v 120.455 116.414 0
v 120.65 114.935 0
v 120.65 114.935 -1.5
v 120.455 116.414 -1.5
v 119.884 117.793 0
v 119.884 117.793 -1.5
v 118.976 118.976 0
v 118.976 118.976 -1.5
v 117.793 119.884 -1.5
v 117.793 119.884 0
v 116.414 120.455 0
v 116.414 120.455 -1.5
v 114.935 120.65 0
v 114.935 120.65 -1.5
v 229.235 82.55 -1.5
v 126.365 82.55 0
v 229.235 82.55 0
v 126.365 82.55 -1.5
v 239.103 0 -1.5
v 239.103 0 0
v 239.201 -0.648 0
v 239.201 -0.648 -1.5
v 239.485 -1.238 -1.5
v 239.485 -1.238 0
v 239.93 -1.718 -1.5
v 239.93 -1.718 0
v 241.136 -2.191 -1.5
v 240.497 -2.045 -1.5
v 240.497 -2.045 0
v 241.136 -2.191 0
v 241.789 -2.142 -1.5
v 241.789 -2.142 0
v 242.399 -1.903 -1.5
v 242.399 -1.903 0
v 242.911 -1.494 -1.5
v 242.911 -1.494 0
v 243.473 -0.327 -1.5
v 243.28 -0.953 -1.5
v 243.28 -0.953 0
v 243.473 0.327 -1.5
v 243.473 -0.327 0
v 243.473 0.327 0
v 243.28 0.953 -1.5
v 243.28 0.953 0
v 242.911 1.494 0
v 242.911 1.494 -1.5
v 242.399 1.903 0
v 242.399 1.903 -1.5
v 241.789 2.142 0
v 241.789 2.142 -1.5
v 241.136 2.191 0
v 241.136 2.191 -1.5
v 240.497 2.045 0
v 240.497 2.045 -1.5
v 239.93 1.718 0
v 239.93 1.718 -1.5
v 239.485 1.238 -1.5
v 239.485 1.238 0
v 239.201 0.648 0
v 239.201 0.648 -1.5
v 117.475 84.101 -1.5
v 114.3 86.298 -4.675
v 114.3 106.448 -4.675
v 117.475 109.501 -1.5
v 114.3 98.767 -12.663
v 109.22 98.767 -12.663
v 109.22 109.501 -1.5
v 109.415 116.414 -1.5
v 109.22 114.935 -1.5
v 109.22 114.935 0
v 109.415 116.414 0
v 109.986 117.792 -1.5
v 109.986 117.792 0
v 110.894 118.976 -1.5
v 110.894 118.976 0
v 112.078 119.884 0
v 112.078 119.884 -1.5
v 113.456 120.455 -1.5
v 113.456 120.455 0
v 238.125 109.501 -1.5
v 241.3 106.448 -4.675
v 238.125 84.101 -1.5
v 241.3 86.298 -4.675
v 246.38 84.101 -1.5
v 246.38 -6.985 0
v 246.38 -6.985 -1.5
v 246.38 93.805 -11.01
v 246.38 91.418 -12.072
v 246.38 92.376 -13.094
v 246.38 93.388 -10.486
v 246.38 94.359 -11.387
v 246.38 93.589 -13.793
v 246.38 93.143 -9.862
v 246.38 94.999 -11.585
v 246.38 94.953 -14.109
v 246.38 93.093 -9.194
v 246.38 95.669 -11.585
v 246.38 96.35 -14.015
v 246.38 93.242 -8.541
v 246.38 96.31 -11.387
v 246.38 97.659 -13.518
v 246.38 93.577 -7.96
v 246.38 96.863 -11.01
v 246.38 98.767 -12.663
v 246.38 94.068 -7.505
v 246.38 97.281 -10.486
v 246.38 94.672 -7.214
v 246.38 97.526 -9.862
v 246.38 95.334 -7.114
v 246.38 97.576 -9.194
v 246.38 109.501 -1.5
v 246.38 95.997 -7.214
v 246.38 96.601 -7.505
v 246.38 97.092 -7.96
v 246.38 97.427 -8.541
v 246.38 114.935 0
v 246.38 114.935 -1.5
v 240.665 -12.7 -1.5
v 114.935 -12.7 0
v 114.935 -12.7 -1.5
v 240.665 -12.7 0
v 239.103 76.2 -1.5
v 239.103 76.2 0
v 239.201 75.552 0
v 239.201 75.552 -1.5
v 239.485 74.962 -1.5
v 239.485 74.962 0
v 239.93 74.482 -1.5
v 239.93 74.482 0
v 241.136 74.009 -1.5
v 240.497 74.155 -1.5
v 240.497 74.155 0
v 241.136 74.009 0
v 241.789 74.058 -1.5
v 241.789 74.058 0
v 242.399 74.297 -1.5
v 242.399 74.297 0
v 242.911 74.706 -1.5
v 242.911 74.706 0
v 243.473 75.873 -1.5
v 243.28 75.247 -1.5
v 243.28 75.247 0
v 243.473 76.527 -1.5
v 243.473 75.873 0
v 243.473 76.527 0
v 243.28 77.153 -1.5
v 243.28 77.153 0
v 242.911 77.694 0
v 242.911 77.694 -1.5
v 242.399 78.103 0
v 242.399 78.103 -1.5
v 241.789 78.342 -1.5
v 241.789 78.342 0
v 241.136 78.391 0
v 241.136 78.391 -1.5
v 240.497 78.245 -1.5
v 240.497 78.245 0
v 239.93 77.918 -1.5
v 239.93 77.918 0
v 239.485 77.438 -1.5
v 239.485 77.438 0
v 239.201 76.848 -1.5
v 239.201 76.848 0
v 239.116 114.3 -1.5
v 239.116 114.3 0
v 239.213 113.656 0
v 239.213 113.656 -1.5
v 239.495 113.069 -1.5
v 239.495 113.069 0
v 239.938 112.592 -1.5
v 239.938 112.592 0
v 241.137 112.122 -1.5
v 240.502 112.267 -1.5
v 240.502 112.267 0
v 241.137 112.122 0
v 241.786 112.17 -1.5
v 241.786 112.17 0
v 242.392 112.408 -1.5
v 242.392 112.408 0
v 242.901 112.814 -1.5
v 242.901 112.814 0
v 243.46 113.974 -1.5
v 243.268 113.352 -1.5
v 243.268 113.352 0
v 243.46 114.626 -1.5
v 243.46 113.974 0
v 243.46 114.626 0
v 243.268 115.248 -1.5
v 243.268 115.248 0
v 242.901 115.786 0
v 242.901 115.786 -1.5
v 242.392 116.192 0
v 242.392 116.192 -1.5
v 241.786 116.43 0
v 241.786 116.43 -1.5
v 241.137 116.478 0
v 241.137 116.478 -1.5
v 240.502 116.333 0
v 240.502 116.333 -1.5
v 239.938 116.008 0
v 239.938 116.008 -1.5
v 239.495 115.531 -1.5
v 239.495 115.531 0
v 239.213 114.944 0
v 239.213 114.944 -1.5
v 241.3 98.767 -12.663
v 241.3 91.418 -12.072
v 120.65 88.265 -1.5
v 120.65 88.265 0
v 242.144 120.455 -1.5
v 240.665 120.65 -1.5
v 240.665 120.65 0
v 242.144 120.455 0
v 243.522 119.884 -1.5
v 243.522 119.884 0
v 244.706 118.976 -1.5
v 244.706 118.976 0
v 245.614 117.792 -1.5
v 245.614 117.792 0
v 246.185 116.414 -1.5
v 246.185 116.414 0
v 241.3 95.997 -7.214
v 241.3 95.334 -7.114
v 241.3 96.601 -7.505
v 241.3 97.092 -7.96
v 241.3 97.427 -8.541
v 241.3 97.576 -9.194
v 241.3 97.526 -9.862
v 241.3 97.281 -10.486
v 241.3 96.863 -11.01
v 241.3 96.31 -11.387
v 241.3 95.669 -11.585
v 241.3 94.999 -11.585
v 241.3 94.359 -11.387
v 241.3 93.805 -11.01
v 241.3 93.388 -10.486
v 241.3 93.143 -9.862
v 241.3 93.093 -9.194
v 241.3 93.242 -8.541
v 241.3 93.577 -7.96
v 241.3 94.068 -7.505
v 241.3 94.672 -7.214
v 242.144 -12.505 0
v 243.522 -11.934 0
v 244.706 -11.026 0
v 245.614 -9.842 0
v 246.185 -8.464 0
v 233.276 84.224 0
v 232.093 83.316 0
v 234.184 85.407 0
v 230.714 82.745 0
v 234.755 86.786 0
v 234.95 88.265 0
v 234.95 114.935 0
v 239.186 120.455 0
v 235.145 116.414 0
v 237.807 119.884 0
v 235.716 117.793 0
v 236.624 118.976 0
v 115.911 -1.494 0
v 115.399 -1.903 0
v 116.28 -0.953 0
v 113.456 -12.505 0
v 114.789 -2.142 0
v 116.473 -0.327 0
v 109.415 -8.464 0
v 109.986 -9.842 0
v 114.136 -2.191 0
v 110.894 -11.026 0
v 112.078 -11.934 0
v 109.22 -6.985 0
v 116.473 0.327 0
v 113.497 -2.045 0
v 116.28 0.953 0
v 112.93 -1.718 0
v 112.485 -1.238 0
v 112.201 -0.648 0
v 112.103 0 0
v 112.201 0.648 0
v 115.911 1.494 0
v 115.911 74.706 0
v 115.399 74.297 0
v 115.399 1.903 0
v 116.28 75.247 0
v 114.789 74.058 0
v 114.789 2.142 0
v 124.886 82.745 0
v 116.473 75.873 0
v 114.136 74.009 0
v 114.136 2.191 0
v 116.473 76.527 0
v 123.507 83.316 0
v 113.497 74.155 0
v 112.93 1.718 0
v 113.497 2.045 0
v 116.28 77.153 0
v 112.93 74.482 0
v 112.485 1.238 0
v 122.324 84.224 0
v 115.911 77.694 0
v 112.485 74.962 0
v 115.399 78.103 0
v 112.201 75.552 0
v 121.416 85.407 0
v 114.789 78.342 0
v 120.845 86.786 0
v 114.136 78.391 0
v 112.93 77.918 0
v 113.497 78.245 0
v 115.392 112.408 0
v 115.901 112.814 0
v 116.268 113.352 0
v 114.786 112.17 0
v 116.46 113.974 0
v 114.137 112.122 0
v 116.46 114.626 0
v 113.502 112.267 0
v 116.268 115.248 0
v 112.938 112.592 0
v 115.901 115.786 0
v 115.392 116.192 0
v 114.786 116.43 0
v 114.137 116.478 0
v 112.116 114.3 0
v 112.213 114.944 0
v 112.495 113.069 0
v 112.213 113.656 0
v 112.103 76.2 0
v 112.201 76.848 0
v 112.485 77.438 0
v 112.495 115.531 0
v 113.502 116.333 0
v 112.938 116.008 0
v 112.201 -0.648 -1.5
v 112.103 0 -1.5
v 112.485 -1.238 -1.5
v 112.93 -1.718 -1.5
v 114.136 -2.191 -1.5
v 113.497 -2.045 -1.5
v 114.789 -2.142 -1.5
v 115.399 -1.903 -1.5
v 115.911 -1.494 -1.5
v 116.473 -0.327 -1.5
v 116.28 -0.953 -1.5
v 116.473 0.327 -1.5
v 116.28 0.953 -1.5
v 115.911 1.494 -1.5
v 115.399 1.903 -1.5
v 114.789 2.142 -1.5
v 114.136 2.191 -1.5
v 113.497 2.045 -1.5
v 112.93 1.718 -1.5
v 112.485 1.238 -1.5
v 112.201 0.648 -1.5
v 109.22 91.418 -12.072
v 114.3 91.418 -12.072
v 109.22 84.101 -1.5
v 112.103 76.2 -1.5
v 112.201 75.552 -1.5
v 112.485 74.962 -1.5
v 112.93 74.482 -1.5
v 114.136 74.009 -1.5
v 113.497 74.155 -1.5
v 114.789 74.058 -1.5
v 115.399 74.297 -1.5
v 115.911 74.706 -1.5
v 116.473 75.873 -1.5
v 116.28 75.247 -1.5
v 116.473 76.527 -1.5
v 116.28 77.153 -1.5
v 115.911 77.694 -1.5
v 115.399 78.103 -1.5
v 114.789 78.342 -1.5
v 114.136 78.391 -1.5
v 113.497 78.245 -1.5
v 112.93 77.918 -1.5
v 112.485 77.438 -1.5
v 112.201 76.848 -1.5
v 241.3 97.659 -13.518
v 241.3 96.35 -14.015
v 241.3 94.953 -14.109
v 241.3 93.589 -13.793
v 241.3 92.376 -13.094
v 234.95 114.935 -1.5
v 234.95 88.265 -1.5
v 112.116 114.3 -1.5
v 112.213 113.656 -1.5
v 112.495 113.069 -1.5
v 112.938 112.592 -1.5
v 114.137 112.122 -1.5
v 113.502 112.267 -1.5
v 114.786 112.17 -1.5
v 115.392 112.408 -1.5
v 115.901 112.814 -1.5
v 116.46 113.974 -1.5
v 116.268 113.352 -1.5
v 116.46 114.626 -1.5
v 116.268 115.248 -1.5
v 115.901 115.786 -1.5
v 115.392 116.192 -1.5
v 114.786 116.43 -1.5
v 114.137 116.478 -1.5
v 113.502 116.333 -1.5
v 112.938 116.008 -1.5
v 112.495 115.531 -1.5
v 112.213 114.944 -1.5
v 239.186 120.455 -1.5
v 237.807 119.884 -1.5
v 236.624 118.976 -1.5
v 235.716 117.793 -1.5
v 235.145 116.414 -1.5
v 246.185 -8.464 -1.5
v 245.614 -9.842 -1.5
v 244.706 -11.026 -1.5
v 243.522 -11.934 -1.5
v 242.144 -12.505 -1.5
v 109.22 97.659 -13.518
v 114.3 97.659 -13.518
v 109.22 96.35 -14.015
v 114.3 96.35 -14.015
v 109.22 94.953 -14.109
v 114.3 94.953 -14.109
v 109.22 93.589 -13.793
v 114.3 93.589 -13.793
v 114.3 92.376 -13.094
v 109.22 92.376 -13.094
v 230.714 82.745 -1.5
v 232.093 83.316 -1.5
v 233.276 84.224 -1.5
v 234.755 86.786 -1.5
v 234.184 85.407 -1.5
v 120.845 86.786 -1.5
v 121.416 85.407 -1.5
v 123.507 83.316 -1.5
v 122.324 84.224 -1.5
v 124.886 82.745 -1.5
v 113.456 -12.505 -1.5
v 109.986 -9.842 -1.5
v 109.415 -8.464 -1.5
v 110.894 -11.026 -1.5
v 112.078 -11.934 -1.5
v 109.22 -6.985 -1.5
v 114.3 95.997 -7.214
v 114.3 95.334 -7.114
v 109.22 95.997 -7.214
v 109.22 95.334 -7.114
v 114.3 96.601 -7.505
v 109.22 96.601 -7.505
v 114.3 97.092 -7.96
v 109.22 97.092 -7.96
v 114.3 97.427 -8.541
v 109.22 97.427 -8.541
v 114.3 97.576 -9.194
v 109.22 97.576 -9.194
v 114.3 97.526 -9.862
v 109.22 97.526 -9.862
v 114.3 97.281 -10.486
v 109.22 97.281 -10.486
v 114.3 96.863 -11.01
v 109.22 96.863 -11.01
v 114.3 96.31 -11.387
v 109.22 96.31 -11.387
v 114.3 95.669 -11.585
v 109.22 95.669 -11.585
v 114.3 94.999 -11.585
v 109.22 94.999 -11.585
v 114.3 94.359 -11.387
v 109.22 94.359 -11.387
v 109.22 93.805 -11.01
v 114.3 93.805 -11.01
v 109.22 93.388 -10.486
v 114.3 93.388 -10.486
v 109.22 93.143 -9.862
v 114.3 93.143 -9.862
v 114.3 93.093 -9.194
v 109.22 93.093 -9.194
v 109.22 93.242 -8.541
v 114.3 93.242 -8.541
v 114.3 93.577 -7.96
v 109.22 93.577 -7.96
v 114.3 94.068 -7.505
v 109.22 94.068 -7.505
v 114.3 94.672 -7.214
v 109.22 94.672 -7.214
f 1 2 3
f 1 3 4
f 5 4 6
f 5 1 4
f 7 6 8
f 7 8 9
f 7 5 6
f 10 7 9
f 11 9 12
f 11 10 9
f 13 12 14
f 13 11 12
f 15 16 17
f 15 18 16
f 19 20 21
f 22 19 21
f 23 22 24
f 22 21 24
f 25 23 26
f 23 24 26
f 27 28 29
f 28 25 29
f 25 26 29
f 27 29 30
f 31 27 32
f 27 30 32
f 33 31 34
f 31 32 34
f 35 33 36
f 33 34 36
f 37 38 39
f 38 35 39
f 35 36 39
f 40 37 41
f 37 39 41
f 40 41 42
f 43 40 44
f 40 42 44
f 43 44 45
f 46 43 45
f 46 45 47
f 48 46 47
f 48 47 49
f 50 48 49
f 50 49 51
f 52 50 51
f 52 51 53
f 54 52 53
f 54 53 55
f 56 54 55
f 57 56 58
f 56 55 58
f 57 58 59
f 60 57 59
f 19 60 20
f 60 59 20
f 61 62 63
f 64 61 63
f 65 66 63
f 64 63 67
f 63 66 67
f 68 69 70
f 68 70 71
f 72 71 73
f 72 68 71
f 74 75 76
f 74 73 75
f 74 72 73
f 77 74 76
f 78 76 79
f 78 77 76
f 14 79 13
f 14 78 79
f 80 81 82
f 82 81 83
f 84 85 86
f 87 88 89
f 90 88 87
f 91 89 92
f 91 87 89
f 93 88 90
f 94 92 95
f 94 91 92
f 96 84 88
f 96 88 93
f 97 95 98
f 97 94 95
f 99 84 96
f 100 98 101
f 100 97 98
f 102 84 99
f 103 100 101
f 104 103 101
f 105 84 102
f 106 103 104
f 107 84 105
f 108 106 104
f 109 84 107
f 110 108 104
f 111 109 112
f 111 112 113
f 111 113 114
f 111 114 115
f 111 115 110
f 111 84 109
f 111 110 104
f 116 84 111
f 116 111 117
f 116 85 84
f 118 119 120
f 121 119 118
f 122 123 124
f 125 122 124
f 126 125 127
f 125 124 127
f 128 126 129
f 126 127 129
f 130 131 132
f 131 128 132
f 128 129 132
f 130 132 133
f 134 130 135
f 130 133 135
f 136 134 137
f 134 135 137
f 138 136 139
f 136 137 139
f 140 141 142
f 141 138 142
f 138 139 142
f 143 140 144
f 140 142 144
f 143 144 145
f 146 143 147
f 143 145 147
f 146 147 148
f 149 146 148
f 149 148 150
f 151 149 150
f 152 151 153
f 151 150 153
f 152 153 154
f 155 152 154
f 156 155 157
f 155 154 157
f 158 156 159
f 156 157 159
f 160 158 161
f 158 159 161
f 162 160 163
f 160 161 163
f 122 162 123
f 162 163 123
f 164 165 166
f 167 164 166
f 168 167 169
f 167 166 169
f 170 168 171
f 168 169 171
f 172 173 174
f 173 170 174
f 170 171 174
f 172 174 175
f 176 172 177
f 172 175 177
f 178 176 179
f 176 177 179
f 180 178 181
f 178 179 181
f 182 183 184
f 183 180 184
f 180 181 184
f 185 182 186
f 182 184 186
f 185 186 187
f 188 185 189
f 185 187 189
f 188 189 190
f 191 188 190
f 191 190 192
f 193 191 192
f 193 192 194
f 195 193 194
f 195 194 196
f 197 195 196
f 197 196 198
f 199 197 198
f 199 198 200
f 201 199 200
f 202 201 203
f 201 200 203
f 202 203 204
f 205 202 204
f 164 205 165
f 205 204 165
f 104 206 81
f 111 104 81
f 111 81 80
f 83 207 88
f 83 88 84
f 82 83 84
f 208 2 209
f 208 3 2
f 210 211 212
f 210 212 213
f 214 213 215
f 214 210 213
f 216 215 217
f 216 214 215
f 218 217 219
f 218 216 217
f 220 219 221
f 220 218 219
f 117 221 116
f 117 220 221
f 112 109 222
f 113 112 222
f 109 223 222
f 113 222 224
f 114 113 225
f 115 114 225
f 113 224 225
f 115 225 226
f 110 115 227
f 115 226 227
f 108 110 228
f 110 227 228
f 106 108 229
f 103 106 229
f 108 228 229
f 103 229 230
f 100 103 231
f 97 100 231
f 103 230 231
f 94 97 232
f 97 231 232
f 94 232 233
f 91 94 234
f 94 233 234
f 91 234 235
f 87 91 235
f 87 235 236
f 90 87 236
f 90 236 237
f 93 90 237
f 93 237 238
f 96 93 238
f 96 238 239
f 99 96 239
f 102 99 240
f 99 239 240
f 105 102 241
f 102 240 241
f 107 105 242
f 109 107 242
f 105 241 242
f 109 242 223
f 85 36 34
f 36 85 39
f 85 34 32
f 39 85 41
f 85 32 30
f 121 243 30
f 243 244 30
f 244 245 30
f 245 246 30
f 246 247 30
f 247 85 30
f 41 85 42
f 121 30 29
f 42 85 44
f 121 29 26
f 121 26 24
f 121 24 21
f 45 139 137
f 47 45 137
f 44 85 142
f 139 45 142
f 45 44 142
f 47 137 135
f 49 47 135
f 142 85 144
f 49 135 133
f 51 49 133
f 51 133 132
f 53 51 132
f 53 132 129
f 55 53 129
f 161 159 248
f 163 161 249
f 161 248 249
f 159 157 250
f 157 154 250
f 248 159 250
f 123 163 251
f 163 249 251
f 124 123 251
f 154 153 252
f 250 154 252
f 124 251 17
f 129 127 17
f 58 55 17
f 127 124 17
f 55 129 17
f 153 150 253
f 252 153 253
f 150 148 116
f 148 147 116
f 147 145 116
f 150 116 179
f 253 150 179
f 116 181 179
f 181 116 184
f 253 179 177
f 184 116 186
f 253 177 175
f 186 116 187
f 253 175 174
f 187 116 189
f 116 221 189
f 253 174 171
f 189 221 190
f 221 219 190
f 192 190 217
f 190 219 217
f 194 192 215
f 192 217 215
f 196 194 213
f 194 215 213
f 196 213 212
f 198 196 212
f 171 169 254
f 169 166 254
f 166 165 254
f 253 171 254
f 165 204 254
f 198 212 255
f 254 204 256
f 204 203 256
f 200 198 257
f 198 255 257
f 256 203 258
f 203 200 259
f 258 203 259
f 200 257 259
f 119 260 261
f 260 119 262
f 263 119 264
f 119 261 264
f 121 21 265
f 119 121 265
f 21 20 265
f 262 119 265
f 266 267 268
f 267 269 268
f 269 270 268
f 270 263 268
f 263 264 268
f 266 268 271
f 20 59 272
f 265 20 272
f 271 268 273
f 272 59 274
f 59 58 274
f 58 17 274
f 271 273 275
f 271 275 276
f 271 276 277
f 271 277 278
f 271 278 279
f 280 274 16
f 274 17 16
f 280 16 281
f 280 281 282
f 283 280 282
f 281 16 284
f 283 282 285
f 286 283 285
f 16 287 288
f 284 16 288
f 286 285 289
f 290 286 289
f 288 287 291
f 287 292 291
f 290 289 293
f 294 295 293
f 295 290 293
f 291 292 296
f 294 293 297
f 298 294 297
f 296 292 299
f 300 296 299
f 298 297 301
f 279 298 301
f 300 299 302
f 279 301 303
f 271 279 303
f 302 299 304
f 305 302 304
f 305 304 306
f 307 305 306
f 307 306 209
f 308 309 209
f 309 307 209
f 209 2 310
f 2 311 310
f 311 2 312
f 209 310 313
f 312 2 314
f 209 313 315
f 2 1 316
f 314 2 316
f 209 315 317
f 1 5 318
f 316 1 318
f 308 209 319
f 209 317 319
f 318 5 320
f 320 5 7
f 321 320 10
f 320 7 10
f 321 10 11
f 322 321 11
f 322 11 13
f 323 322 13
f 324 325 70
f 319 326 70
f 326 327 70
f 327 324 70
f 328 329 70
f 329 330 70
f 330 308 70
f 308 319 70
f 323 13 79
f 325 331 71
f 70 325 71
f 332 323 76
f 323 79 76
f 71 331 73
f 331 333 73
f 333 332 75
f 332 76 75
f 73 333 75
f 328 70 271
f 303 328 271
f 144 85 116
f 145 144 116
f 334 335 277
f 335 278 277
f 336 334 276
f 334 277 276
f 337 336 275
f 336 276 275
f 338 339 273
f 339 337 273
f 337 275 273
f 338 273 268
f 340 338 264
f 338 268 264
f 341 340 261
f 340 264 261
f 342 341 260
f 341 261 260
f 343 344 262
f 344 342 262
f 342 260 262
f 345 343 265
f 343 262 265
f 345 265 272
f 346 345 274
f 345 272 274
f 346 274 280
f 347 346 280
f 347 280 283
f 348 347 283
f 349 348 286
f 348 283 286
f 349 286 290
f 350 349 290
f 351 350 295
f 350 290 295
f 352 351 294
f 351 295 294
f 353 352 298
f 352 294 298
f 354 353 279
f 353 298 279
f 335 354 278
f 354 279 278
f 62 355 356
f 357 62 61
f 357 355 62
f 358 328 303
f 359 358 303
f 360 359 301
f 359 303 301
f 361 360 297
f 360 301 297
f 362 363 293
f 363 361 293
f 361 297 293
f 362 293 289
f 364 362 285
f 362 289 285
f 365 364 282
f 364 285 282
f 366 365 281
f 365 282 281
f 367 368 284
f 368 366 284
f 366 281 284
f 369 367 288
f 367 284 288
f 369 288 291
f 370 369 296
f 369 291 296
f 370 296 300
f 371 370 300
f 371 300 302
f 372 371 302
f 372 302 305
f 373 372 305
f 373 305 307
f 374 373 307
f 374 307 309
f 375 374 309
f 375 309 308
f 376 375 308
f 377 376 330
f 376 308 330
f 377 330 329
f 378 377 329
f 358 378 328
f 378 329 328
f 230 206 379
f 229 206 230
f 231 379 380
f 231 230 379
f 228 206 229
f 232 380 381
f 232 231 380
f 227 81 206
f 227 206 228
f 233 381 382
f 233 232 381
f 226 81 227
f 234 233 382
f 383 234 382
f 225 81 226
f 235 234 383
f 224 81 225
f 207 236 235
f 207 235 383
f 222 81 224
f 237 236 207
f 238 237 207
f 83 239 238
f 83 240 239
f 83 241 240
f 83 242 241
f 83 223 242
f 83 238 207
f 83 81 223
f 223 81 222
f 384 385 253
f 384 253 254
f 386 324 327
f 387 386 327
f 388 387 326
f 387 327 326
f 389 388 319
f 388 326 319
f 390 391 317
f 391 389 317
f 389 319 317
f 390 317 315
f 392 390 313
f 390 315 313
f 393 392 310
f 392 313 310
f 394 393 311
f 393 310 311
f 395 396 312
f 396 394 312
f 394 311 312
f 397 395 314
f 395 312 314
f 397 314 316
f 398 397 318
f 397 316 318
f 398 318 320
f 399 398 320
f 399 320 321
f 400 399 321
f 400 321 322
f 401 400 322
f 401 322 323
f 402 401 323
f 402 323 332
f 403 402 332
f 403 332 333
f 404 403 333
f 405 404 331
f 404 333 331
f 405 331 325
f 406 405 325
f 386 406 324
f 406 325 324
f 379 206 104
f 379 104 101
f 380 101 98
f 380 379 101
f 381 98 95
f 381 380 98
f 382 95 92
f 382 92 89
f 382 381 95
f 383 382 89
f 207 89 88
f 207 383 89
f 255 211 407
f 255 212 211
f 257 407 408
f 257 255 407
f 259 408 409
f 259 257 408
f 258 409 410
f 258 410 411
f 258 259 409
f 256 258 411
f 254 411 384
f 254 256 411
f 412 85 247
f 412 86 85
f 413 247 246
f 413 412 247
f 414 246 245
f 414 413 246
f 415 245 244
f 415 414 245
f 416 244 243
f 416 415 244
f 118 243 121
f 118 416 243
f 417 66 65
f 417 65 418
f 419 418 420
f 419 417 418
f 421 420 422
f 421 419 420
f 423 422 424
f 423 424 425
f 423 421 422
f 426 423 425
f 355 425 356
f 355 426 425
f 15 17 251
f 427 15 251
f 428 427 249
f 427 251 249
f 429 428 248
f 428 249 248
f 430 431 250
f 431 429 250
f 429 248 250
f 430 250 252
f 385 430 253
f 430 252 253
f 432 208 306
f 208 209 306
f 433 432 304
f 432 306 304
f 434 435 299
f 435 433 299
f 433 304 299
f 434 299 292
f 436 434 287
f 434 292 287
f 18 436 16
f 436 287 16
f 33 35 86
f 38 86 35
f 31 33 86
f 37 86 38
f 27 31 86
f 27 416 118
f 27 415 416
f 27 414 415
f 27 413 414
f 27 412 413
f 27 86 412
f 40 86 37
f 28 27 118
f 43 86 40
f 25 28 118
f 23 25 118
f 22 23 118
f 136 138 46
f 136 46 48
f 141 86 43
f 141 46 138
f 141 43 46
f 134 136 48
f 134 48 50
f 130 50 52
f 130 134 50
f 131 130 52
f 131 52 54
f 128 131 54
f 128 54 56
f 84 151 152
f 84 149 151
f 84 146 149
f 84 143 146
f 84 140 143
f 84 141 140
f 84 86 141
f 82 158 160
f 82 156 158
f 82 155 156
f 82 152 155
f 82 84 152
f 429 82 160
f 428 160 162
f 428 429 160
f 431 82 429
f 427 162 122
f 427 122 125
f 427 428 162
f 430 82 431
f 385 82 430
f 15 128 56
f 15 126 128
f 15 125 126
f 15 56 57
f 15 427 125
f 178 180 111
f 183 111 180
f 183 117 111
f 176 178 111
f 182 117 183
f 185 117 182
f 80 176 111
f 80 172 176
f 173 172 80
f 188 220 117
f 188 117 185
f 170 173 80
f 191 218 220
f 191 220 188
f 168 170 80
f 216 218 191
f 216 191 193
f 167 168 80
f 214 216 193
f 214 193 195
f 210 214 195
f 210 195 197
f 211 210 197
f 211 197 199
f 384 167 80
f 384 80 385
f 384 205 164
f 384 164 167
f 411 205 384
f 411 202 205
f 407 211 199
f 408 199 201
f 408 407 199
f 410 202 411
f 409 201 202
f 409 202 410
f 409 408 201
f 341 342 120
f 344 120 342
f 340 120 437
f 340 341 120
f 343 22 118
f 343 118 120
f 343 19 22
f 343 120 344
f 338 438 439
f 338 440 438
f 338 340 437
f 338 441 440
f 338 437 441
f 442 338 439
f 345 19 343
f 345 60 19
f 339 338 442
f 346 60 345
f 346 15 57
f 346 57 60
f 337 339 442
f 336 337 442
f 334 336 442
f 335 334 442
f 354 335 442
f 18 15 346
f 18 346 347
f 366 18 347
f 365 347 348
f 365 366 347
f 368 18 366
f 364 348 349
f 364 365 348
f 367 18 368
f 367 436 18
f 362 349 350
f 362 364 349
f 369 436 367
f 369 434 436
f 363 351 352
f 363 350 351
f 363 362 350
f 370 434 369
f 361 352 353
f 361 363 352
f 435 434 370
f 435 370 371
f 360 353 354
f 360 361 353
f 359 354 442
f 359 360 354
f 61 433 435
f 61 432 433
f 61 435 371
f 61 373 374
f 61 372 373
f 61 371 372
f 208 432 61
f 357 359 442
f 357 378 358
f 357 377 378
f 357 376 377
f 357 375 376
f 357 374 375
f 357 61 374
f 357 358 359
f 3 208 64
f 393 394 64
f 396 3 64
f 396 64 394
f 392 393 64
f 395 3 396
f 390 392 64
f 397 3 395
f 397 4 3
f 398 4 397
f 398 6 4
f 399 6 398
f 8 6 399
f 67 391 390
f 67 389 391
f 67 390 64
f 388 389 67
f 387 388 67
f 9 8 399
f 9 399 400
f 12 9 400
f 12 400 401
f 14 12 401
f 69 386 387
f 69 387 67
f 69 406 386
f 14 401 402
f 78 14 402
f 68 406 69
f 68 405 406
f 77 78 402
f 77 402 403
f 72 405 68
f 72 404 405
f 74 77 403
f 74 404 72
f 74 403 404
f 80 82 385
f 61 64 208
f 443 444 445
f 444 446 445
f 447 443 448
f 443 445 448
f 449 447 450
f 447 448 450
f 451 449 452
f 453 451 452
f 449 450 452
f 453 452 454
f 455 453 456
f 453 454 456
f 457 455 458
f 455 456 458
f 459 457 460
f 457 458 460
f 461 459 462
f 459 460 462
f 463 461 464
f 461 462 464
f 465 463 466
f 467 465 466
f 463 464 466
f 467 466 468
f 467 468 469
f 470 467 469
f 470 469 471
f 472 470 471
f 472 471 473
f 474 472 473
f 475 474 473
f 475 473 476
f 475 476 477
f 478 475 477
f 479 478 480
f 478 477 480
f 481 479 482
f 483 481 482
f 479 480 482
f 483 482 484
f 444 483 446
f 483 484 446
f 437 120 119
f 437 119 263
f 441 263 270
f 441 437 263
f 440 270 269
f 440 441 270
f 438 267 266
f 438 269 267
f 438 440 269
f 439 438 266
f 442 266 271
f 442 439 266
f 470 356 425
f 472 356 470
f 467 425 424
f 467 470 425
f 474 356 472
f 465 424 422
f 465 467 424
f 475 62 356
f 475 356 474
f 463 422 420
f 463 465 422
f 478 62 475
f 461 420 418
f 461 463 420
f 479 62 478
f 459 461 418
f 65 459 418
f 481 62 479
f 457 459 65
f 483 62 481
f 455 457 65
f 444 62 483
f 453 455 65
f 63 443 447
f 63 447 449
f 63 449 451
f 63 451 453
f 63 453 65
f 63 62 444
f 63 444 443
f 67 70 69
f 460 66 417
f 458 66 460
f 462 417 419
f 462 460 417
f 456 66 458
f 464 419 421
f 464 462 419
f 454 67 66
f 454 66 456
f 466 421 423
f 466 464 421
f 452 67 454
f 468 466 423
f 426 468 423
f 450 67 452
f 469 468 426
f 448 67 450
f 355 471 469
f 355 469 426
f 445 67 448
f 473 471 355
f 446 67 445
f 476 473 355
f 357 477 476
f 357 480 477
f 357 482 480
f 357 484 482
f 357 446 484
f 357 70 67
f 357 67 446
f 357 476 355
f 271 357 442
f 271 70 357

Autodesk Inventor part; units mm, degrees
ref_plane "YZ Plane" through (0, 0, 0) normal (1, 0, 0) x (0, 1, 0)
ref_plane "XZ Plane" through (0, 0, 0) normal (0, 1, 0) x (-1, 0, 0)
ref_plane "XY Plane" through (0, 0, 0) normal (0, 0, 1) x (1, 0, 0)
ref_plane "Work Plane1" through (0, 0, 0) normal (0, 0, 1) x (1, 0, 0)
sketch "Sketch1" plane through (228.6, 0, 0) normal (0, 0, -1) x (-1, 0, 0)
  circle A0 centre (-12.7, 0) radius 2.1971 projected
  circle A1 centre (114.3, 0) radius 2.1971 projected
  circle A2 centre (-12.7, 76.2) radius 2.1971 projected
  circle A3 centre (114.3, 76.2) radius 2.1971 projected
  line L0 (-17.78, 120.65) -> (119.38, 120.65)
  line L1 (119.38, 120.65) -> (119.38, -12.7)
  line L2 (119.38, -12.7) -> (-17.78, -12.7)
  line L3 (-17.78, -12.7) -> (-17.78, 120.65)
  circle A4 centre (114.3, 114.3) radius 2.1844 projected
  circle A5 centre (-12.7, 114.3) radius 2.1844 projected
  point P0 (228.6, 0)
  dimension "d0" = 12.7
  dimension "d2" = 5.08
  dimension "d3" = 5.08
  dimension "d6" = 6.35
extrude "Extrusion1" add sketch "Sketch1" along normal blind 1.5
fillet "Fillet2" radius 5.715 4 edges at (246.38, 120.65, -0.75) (109.22, 120.65, -0.75) (109.22, -12.7, -0.75) (246.38, -12.7, -0.75)
sketch "Sketch7" plane through (109.22, -6.985, 0) normal (-1, 0, 0) x (0, 0, 1)
  circle A0 centre (-9.3619, 102.3193) radius 2.2479 projected
  arc A1 (-12.6628, 105.7523) -> (-12.0724, 98.4034) centre (-9.3619, 102.3193) ccw
  line L0 (-12.6628, 105.7523) -> (-1.5, 116.4856)
  line L1 (-12.0724, 98.4034) -> (-1.5, 91.0856)
  line L2 (-1.5, 0) -> (-1.5, 121.92) projected
  point P0 (0, 6.985)
  dimension "d38" = 9.525
  dimension "d39" = 25.4
  dimension "d40" = 78.566
extrude "Extrusion6" add sketch "Sketch7" against normal up to surface (137.16 mm away)
sketch "Sketch8" plane through (228.6, 0, -1.5) normal (0, 0, -1) x (-1, 0, 0)
  arc A0 (-17.78, -6.985) -> (-12.065, -12.7) centre (-12.065, -6.985) ccw projected
  line L0 (-17.78, 114.935) -> (-17.78, -6.985) projected
  arc A1 (-12.065, 120.65) -> (-17.78, 114.935) centre (-12.065, 114.935) ccw projected
  line L1 (113.665, 120.65) -> (-12.065, 120.65) projected
  arc A2 (119.38, 114.935) -> (113.665, 120.65) centre (113.665, 114.935) ccw projected
  line L2 (119.38, -6.985) -> (119.38, 114.935) projected
  arc A3 (113.665, -12.7) -> (119.38, -6.985) centre (113.665, -6.985) ccw projected
  line L3 (-12.065, -12.7) -> (113.665, -12.7) projected
  circle A4 centre (-12.7, 114.3) radius 2.1844 projected
  circle A5 centre (114.3, 114.3) radius 2.1844 projected
  circle A6 centre (114.3, 76.2) radius 2.1971 projected
  circle A7 centre (-12.7, 76.2) radius 2.1971 projected
  circle A8 centre (114.3, 0) radius 2.1971 projected
  circle A9 centre (-12.7, 0) radius 2.1971 projected
  line L4 (119.38, 84.1006) -> (-17.78, 84.1006) projected
  line L5 (-17.78, 109.5006) -> (119.38, 109.5006) projected
  line L6 (-12.7, 109.5006) -> (-12.7, 84.1006)
  line L7 (114.3, 84.1006) -> (114.3, 109.5006)
  point P0 (228.6, 0)
  dimension "d43" = 5.08
  dimension "d44" = 5.08
extrude "Extrusion7" cut sketch "Sketch8" along normal through all contours L6 L5 L7 L4
chamfer "Chamfer2" distance 3.175 angle 45 2 edges at (114.3, 96.8006, -1.5) (241.3, 96.8006, -1.5)
sketch "Sketch9" plane through (228.6, 0, -1.5) normal (0, 0, -1) x (-1, 0, 0)
  line L0 (113.665, 120.65) -> (-12.065, 120.65) projected
  line L1 (-6.35, 120.65) -> (107.95, 120.65)
  line L2 (107.95, 120.65) -> (107.95, 82.55)
  line L3 (107.95, 82.55) -> (-6.35, 82.55)
  line L4 (-6.35, 82.55) -> (-6.35, 120.65)
  line L5 (119.38, -6.985) -> (119.38, 84.1006) projected
  line L6 (-17.78, 84.1006) -> (-17.78, -6.985) projected
  point P0 (228.6, 0)
  dimension "d50" = 38.1
  dimension "d51" = 114.3
  dimension "d52" = 11.43
  dimension "d53" = 11.43
extrude "Extrusion8" cut sketch "Sketch9" against normal through all
fillet "Fillet3" radius 5.715 4 edges at (234.95, 82.55, -0.75) (120.65, 82.55, -0.75) (120.65, 120.65, -0.75) (234.95, 120.65, -0.75)
equation "\"d52\" = d53"
properties part number "bottom rails" material "Acetal Resin, Black"
